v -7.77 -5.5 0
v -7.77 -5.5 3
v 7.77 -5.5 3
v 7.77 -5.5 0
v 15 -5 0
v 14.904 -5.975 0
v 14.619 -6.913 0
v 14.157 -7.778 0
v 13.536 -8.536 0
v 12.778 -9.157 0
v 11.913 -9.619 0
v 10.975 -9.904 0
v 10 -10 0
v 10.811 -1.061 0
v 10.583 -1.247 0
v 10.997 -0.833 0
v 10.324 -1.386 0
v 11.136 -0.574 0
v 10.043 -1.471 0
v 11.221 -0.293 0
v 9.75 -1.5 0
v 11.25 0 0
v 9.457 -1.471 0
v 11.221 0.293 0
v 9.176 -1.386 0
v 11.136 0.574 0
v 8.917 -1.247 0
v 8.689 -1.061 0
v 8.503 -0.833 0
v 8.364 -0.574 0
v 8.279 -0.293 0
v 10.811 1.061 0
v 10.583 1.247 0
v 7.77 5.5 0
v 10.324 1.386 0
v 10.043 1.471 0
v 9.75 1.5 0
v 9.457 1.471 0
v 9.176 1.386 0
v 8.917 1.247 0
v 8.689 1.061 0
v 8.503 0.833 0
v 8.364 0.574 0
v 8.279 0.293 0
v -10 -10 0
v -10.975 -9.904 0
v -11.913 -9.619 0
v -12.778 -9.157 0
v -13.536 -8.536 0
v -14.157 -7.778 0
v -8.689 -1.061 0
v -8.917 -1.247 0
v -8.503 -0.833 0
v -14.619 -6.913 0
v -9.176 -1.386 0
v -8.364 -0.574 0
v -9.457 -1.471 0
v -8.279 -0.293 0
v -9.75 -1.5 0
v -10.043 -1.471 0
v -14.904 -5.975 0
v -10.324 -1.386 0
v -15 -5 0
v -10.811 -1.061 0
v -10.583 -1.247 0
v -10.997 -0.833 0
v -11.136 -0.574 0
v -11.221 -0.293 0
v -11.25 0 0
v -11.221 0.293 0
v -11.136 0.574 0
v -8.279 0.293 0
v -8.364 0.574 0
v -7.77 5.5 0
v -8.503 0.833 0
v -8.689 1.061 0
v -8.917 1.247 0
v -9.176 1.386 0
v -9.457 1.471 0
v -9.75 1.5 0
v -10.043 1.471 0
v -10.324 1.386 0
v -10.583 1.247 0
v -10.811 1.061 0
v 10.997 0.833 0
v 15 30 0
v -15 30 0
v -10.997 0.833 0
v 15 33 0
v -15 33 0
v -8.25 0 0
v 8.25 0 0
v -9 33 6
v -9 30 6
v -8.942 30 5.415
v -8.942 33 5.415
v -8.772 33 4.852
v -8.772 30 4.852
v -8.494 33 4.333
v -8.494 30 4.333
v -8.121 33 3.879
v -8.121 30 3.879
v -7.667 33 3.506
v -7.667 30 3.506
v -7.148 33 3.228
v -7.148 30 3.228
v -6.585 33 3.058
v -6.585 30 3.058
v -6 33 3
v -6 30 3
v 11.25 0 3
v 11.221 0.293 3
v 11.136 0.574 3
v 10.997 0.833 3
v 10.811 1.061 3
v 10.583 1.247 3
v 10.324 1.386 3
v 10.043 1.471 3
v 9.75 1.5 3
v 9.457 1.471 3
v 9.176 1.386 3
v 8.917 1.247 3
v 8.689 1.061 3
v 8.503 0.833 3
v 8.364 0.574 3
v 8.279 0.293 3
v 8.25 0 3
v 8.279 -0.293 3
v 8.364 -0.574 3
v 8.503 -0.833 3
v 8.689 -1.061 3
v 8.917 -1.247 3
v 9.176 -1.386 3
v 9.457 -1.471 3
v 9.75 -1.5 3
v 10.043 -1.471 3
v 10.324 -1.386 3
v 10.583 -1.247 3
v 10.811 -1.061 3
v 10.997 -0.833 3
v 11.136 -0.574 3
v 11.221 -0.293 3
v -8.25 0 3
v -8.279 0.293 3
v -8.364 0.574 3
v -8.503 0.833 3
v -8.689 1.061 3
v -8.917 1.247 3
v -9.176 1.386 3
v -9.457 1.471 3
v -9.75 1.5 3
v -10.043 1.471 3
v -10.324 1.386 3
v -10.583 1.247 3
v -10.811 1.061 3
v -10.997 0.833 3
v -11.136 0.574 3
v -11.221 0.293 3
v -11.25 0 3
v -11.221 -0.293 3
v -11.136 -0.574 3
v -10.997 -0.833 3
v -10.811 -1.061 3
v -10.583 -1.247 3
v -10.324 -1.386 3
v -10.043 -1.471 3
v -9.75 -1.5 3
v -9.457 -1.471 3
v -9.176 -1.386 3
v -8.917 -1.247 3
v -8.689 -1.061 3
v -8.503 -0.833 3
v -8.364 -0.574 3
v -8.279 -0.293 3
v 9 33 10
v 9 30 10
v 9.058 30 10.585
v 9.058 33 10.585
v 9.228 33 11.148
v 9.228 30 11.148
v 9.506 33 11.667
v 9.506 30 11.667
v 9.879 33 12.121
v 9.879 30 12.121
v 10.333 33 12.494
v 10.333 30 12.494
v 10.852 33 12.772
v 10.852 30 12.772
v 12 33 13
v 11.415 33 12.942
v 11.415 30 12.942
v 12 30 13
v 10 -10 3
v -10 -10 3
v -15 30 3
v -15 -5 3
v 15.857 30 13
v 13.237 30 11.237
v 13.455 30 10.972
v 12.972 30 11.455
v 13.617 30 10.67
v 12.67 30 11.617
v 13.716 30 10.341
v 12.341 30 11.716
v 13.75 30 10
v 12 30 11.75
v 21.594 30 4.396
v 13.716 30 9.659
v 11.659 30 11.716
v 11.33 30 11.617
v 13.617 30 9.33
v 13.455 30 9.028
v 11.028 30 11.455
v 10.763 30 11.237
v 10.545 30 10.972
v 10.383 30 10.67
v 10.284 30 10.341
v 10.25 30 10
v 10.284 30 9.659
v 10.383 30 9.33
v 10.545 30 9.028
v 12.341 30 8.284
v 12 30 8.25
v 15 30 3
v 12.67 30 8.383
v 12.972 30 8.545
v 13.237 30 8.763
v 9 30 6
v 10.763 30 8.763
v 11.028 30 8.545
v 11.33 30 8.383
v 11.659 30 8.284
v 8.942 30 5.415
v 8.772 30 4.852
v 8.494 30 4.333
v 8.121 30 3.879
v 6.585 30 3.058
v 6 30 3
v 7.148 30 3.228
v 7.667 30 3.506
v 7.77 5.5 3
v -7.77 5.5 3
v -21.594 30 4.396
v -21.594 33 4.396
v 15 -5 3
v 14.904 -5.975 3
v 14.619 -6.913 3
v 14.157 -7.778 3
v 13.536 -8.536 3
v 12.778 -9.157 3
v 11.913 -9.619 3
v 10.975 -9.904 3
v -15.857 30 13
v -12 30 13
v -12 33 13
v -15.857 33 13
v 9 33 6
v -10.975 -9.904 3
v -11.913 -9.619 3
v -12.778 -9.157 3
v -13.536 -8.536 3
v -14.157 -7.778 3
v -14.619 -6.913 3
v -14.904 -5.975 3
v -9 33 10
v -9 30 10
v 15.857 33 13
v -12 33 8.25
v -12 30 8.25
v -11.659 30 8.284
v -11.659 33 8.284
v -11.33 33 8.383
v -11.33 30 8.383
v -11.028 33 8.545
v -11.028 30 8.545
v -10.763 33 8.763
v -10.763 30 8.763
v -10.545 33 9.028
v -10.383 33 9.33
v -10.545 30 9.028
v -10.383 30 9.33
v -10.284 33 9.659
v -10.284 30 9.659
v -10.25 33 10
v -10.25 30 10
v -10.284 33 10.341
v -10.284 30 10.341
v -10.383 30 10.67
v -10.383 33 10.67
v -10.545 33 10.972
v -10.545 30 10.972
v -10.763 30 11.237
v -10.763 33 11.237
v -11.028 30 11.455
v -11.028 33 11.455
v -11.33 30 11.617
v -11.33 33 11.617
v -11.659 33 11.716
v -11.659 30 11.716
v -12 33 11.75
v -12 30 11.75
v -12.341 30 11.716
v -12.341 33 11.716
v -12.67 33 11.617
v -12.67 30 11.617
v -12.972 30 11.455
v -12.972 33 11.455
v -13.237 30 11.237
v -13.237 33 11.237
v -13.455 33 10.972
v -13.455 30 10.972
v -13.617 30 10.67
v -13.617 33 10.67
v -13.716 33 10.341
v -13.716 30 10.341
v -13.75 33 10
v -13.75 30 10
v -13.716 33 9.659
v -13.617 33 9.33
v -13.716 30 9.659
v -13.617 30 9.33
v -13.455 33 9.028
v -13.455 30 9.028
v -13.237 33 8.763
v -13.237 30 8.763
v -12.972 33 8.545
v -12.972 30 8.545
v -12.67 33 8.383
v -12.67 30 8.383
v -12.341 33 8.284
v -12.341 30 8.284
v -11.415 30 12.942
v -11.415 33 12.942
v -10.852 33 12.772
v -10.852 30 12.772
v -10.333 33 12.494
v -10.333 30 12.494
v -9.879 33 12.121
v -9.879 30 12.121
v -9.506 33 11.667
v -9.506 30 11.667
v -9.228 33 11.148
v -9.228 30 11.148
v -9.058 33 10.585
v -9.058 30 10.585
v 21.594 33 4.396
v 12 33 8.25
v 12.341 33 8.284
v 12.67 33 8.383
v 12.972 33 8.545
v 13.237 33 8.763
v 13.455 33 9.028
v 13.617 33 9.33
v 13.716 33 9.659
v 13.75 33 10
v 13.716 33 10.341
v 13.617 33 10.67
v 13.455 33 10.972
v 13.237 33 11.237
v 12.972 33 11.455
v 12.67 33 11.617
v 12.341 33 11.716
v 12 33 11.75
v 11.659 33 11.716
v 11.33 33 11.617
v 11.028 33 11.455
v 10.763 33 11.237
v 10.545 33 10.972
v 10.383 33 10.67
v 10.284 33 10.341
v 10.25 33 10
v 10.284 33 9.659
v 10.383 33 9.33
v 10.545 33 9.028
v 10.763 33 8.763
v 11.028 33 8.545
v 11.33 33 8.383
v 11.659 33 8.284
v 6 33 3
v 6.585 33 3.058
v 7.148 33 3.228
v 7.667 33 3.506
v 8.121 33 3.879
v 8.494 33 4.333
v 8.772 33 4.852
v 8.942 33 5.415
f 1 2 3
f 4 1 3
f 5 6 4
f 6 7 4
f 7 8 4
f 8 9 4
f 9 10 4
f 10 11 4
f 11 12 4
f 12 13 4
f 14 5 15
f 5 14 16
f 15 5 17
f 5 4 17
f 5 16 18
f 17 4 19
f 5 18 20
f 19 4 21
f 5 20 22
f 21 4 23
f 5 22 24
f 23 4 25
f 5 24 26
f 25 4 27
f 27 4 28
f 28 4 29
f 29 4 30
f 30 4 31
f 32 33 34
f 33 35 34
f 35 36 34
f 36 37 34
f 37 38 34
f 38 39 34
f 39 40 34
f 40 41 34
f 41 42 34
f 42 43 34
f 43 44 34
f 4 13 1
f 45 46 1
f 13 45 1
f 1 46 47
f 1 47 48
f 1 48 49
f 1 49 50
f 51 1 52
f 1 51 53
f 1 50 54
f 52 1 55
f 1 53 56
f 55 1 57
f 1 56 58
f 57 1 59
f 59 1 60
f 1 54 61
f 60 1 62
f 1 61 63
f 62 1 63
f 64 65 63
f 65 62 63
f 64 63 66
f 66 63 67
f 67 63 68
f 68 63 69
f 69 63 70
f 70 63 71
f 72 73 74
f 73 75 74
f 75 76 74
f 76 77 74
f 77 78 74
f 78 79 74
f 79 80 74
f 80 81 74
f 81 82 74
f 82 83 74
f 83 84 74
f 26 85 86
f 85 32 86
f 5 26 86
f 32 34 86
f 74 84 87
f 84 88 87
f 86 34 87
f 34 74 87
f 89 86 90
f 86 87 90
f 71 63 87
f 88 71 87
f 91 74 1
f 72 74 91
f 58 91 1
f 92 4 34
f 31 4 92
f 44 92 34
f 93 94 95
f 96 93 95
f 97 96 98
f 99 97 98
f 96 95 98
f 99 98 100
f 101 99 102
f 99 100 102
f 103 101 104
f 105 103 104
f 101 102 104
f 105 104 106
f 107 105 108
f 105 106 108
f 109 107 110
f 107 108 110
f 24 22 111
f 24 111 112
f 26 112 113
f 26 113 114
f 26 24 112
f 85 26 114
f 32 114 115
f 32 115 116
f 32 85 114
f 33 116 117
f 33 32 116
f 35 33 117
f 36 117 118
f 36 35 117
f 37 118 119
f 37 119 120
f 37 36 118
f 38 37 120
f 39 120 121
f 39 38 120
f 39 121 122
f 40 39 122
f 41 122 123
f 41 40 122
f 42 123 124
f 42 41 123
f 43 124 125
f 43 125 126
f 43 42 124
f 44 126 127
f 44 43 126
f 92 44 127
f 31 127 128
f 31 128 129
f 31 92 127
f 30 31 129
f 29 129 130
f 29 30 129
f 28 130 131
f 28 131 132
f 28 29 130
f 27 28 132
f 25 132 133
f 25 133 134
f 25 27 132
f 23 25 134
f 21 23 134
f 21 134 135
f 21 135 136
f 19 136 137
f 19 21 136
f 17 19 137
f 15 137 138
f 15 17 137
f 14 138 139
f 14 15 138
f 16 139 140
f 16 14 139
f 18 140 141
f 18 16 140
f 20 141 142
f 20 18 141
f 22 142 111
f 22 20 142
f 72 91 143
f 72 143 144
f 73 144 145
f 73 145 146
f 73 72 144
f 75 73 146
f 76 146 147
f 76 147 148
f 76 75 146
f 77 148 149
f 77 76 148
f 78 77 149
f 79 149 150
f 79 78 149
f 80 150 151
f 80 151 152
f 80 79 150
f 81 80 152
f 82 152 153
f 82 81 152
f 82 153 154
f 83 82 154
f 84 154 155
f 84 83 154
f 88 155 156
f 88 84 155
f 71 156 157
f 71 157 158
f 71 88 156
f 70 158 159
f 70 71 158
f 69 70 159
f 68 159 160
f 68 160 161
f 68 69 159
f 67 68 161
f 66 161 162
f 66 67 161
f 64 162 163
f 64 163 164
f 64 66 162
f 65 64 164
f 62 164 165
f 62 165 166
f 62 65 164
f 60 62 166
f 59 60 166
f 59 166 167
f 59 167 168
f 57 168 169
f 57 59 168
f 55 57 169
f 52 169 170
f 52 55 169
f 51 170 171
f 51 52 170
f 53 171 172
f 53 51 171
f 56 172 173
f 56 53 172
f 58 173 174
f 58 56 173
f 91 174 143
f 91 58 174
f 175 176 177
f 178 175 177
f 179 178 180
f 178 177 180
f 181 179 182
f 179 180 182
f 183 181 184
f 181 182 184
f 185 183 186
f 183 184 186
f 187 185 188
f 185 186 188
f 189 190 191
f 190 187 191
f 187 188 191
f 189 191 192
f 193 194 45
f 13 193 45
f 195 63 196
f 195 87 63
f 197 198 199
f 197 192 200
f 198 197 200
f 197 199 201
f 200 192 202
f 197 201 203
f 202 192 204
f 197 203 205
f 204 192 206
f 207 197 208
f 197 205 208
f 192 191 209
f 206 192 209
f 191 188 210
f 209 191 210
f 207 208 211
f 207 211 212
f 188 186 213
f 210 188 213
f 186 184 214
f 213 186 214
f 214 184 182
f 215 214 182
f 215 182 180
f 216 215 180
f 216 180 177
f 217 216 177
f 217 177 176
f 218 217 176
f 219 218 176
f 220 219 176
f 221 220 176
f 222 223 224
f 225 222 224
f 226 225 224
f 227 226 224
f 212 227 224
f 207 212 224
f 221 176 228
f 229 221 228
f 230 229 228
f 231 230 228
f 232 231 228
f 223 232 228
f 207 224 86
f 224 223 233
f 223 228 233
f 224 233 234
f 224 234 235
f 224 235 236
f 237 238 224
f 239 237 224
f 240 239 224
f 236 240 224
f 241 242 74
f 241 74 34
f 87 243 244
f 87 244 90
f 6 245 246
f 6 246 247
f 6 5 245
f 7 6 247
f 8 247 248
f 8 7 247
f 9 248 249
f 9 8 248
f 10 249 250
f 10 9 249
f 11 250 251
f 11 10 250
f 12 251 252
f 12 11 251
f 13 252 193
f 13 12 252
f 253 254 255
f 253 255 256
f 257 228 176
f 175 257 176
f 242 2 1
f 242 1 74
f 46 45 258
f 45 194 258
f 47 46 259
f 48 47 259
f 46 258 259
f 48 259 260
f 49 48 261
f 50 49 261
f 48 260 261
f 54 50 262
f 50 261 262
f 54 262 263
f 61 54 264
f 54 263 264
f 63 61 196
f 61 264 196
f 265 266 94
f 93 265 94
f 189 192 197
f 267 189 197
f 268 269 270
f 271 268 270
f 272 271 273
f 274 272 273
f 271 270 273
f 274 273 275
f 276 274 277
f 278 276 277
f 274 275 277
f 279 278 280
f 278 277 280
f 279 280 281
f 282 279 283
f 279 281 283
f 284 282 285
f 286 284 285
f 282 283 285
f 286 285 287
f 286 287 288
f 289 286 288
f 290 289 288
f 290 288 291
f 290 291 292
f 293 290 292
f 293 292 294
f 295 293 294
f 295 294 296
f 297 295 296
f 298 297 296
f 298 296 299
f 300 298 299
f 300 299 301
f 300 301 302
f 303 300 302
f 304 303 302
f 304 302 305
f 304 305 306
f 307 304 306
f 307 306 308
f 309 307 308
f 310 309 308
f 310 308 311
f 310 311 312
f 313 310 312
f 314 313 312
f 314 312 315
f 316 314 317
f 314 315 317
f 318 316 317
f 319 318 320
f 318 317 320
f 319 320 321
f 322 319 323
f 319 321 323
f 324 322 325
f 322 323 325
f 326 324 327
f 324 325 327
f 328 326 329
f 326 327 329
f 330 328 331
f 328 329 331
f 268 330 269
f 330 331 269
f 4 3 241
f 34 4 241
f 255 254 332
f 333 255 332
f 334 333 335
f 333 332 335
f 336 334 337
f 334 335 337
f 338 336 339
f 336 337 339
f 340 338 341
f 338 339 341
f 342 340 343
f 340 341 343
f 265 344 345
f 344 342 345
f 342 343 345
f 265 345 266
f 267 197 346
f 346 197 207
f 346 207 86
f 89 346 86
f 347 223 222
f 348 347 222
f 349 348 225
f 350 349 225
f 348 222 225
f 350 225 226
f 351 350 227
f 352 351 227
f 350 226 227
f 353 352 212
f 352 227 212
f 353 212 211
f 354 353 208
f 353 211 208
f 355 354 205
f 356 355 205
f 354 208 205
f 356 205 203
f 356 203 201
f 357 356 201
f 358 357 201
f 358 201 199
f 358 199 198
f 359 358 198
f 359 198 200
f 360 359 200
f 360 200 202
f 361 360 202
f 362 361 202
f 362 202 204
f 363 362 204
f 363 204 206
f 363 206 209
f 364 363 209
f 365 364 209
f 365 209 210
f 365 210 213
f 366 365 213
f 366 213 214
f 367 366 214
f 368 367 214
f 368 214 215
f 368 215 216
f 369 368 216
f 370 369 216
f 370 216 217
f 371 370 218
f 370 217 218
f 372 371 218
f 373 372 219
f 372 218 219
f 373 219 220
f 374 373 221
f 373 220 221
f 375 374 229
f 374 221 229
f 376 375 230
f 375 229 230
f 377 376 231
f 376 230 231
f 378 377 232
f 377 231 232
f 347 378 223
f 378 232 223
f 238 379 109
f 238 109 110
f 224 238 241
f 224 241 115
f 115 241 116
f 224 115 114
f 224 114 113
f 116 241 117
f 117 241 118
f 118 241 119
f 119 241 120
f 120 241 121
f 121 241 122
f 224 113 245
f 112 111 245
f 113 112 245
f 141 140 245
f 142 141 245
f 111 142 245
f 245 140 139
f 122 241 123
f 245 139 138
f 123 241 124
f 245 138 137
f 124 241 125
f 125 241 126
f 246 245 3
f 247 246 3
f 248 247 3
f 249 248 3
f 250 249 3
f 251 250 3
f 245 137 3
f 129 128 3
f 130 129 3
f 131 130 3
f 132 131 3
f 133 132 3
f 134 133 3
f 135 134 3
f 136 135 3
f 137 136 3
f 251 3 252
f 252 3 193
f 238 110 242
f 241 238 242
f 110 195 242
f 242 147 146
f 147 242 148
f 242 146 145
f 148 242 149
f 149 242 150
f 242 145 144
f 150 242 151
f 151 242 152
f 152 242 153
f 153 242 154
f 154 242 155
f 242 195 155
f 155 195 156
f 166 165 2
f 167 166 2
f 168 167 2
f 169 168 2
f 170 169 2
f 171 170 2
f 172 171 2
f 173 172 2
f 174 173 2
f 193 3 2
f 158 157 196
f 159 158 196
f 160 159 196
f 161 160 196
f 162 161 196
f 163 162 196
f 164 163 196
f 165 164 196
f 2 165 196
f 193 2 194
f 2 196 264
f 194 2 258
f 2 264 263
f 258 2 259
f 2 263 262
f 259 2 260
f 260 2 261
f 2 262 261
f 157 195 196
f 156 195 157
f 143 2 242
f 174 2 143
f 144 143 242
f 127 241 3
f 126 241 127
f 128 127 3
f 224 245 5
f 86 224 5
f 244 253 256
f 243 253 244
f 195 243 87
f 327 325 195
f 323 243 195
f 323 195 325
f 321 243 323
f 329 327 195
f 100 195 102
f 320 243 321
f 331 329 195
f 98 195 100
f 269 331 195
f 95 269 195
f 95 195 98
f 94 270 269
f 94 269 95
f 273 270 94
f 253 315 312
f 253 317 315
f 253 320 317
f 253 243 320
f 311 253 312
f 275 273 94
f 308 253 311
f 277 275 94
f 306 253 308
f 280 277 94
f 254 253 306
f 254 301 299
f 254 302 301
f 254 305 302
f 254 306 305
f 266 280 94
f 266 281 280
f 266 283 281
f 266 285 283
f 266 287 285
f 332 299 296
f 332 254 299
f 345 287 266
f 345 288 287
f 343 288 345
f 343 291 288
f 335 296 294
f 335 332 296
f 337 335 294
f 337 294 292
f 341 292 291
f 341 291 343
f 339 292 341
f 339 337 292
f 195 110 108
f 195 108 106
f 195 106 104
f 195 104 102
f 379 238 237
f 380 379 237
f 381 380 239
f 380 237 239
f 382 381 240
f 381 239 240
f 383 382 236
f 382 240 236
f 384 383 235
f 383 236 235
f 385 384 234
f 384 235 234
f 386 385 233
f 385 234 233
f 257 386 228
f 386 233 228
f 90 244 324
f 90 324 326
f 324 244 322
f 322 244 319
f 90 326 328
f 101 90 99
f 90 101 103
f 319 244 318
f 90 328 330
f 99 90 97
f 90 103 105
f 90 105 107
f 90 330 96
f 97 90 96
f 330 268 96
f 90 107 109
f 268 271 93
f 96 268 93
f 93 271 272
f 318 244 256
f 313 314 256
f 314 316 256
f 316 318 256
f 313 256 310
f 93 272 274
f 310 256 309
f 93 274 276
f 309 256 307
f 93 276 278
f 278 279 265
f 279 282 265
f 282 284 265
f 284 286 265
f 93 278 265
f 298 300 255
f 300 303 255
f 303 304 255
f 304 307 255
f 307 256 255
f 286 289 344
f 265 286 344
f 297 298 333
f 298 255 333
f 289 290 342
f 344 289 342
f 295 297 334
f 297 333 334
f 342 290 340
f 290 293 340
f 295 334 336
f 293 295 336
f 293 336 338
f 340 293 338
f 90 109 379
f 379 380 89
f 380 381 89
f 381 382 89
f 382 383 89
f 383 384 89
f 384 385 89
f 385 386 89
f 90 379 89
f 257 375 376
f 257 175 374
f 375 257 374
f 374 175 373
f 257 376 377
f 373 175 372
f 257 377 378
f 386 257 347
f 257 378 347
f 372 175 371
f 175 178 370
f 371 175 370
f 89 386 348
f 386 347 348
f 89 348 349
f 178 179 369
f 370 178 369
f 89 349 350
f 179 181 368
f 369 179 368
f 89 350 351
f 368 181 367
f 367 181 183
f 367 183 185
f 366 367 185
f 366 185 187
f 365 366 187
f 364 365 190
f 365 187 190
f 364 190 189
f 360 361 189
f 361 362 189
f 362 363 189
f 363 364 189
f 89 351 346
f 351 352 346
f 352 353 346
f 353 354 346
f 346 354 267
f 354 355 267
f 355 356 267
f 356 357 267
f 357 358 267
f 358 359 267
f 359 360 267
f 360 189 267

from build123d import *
from build123d.topology import SkipClean

# Parameters (mm, degrees)
SKETCH1_W           = 25
SKETCH1_H           = 20
SKETCH1_R           = 1.5
BOSS_EXTRUDE1_DEPTH = 3
SKETCH2_W           = 15.54
SKETCH2_H           = 11
CUT_EXTRUDE1_DEPTH  = 17.286497475
SKETCH4_W           = 25
SKETCH4_H           = 3
BOSS_EXTRUDE2_DEPTH = 3
SKETCH5_W           = 25
SKETCH5_H           = 3
BOSS_EXTRUDE3_DEPTH = 10
SKETCH11_W          = 25
SKETCH11_H          = 13
BOSS_EXTRUDE5_DEPTH = 20
SKETCH12_W          = 25
SKETCH12_H          = 10
CUT_EXTRUDE4_DEPTH  = 20
BOSS_EXTRUDE6_DEPTH = 2.5
BOSS_EXTRUDE7_DEPTH = 2.5
SKETCH16_R          = 1.75
CUT_EXTRUDE5_DEPTH  = 45.654227124
FILLET6_R           = 3
FILLET7_R           = 3
CUT_EXTRUDE6_DEPTH  = 45.654227124
FILLET8_R           = 5
BOSS_EXTRUDE8_DEPTH = 3


with BuildPart() as part:
    # Sketch1 → Boss-Extrude1 (new body)
    with BuildSketch(Plane.XY):
        Rectangle(SKETCH1_W, SKETCH1_H)
        with Locations((-9.75, 0)):
            Circle(SKETCH1_R, mode=Mode.SUBTRACT)
        with Locations((9.75, 0)):
            Circle(SKETCH1_R, mode=Mode.SUBTRACT)
    extrude(amount=BOSS_EXTRUDE1_DEPTH)

    # Sketch2 → Cut-Extrude1 (cut, through all)
    with BuildSketch(Plane.XY.offset(3)):
        Rectangle(SKETCH2_W, SKETCH2_H)
    extrude(amount=-CUT_EXTRUDE1_DEPTH, mode=Mode.SUBTRACT)

    # Sketch4 → Boss-Extrude2 (add)
    with BuildSketch(Plane(origin=(0, 10, 0), x_dir=(1, 0, 0), z_dir=(0, 1, 0))):
        with Locations((0, -1.5)):
            Rectangle(SKETCH4_W, SKETCH4_H)
    extrude(amount=BOSS_EXTRUDE2_DEPTH)

    # Sketch5 → Boss-Extrude3 (add)
    with BuildSketch(Plane.XY.offset(3)):
        with Locations((0, 11.5)):
            Rectangle(SKETCH5_W, SKETCH5_H)
    extrude(amount=BOSS_EXTRUDE3_DEPTH)

    # Sketch11 → Boss-Extrude5 (add)
    with BuildSketch(Plane(origin=(0, 13, 0), x_dir=(1, 0, 0), z_dir=(0, 1, 0))):
        with Locations((0, -6.5)):
            Rectangle(SKETCH11_W, SKETCH11_H)
    extrude(amount=BOSS_EXTRUDE5_DEPTH)

    # Sketch12 → Cut-Extrude4 (cut)
    with BuildSketch(Plane.XZ.offset(-10)):
        with Locations((0, 8)):
            Rectangle(SKETCH12_W, SKETCH12_H)
    extrude(amount=-CUT_EXTRUDE4_DEPTH, mode=Mode.SUBTRACT)

    # Sketch13 → Boss-Extrude6 (add)
    with BuildSketch(Plane.ZY.offset(12.5)):
        Polygon((3, -10), (3, 30), (13, 30), (13, 33), (0, 33), (0, -10), align=None)
    extrude(amount=BOSS_EXTRUDE6_DEPTH)

    # Sketch14 → Boss-Extrude7 (add)
    with BuildSketch(Plane(origin=(12.5, 0, 0), x_dir=(0, 0, -1), z_dir=(1, 0, 0))):
        Polygon((-13, 30), (-3, 30), (-3, -10), (0, -10), (0, 33), (-13, 33), align=None)
    extrude(amount=BOSS_EXTRUDE7_DEPTH)

    # Sketch16 → Cut-Extrude5 (cut, through all)
    with BuildSketch(Plane.XZ.offset(-30)):
        with Locations(Location((-12, 10, 0), (0, 0, 270))):
            Circle(SKETCH16_R)
        with Locations(Location((12, 10, 0), (0, 0, 270))):
            Circle(SKETCH16_R)
    extrude(amount=-CUT_EXTRUDE5_DEPTH, mode=Mode.SUBTRACT)

    # Fillet6
    fillet6_edges = [part.edges().sort_by_distance(p)[0] for p in [
        (-15, 31.5, 13),
    ]]
    fillet(fillet6_edges, radius=FILLET6_R)

    # Fillet7
    fillet7_edges = [part.edges().sort_by_distance(p)[0] for p in [
        (15, 31.5, 13),
    ]]
    fillet(fillet7_edges, radius=FILLET7_R)

    # Sketch17 → Cut-Extrude6 (cut, through all)
    with SkipClean():  # the faces are left unmerged after this step: merging them gives an invalid solid
        with BuildSketch(Plane.XZ.offset(-30)):
            with BuildLine():
                Line((-9, 10), (-9, 6))
                ThreePointArc((-9, 6), (-8.121320344, 3.878679656), (-6, 3))
                Line((-6, 3), (6, 3))
                ThreePointArc((6, 3), (8.121320344, 3.878679656), (9, 6))
                Line((9, 6), (9, 10))
                ThreePointArc((9, 10), (9.878679656, 12.121320344), (12, 13))
                Line((12, 13), (-12, 13))
                ThreePointArc((-12, 13), (-9.878679656, 12.121320344), (-9, 10))
            make_face()
        extrude(amount=-CUT_EXTRUDE6_DEPTH, mode=Mode.SUBTRACT)

    # Fillet8
    fillet8_edges = [part.edges().sort_by_distance(p)[0] for p in [
        (15, -10, 1.5),
        (-15, -10, 1.5),
    ]]
    fillet(fillet8_edges, radius=FILLET8_R)

    # Sketch18 → Boss-Extrude8 (add)
    with BuildSketch(Plane.XZ.offset(-30)):
        with BuildLine():
            Line((-12, 13), (-15.857475084, 13))
            Line((-15.857475084, 13), (-21.593636596, 4.395757731))
            Line((-21.593636596, 4.395757731), (-15, 0))
            Line((-15, 0), (-15, 10))
            ThreePointArc((-15, 10), (-14.121320344, 12.121320344), (-12, 13))
        make_face()
        with BuildLine():
            Line((12, 13), (15.857475084, 13))
            Line((15.857475084, 13), (21.593636596, 4.395757731))
            Line((21.593636596, 4.395757731), (15, 0))
            Line((15, 0), (15, 10))
            ThreePointArc((15, 10), (14.121320344, 12.121320344), (12, 13))
        make_face()
    extrude(amount=-BOSS_EXTRUDE8_DEPTH)


solid = part.part
